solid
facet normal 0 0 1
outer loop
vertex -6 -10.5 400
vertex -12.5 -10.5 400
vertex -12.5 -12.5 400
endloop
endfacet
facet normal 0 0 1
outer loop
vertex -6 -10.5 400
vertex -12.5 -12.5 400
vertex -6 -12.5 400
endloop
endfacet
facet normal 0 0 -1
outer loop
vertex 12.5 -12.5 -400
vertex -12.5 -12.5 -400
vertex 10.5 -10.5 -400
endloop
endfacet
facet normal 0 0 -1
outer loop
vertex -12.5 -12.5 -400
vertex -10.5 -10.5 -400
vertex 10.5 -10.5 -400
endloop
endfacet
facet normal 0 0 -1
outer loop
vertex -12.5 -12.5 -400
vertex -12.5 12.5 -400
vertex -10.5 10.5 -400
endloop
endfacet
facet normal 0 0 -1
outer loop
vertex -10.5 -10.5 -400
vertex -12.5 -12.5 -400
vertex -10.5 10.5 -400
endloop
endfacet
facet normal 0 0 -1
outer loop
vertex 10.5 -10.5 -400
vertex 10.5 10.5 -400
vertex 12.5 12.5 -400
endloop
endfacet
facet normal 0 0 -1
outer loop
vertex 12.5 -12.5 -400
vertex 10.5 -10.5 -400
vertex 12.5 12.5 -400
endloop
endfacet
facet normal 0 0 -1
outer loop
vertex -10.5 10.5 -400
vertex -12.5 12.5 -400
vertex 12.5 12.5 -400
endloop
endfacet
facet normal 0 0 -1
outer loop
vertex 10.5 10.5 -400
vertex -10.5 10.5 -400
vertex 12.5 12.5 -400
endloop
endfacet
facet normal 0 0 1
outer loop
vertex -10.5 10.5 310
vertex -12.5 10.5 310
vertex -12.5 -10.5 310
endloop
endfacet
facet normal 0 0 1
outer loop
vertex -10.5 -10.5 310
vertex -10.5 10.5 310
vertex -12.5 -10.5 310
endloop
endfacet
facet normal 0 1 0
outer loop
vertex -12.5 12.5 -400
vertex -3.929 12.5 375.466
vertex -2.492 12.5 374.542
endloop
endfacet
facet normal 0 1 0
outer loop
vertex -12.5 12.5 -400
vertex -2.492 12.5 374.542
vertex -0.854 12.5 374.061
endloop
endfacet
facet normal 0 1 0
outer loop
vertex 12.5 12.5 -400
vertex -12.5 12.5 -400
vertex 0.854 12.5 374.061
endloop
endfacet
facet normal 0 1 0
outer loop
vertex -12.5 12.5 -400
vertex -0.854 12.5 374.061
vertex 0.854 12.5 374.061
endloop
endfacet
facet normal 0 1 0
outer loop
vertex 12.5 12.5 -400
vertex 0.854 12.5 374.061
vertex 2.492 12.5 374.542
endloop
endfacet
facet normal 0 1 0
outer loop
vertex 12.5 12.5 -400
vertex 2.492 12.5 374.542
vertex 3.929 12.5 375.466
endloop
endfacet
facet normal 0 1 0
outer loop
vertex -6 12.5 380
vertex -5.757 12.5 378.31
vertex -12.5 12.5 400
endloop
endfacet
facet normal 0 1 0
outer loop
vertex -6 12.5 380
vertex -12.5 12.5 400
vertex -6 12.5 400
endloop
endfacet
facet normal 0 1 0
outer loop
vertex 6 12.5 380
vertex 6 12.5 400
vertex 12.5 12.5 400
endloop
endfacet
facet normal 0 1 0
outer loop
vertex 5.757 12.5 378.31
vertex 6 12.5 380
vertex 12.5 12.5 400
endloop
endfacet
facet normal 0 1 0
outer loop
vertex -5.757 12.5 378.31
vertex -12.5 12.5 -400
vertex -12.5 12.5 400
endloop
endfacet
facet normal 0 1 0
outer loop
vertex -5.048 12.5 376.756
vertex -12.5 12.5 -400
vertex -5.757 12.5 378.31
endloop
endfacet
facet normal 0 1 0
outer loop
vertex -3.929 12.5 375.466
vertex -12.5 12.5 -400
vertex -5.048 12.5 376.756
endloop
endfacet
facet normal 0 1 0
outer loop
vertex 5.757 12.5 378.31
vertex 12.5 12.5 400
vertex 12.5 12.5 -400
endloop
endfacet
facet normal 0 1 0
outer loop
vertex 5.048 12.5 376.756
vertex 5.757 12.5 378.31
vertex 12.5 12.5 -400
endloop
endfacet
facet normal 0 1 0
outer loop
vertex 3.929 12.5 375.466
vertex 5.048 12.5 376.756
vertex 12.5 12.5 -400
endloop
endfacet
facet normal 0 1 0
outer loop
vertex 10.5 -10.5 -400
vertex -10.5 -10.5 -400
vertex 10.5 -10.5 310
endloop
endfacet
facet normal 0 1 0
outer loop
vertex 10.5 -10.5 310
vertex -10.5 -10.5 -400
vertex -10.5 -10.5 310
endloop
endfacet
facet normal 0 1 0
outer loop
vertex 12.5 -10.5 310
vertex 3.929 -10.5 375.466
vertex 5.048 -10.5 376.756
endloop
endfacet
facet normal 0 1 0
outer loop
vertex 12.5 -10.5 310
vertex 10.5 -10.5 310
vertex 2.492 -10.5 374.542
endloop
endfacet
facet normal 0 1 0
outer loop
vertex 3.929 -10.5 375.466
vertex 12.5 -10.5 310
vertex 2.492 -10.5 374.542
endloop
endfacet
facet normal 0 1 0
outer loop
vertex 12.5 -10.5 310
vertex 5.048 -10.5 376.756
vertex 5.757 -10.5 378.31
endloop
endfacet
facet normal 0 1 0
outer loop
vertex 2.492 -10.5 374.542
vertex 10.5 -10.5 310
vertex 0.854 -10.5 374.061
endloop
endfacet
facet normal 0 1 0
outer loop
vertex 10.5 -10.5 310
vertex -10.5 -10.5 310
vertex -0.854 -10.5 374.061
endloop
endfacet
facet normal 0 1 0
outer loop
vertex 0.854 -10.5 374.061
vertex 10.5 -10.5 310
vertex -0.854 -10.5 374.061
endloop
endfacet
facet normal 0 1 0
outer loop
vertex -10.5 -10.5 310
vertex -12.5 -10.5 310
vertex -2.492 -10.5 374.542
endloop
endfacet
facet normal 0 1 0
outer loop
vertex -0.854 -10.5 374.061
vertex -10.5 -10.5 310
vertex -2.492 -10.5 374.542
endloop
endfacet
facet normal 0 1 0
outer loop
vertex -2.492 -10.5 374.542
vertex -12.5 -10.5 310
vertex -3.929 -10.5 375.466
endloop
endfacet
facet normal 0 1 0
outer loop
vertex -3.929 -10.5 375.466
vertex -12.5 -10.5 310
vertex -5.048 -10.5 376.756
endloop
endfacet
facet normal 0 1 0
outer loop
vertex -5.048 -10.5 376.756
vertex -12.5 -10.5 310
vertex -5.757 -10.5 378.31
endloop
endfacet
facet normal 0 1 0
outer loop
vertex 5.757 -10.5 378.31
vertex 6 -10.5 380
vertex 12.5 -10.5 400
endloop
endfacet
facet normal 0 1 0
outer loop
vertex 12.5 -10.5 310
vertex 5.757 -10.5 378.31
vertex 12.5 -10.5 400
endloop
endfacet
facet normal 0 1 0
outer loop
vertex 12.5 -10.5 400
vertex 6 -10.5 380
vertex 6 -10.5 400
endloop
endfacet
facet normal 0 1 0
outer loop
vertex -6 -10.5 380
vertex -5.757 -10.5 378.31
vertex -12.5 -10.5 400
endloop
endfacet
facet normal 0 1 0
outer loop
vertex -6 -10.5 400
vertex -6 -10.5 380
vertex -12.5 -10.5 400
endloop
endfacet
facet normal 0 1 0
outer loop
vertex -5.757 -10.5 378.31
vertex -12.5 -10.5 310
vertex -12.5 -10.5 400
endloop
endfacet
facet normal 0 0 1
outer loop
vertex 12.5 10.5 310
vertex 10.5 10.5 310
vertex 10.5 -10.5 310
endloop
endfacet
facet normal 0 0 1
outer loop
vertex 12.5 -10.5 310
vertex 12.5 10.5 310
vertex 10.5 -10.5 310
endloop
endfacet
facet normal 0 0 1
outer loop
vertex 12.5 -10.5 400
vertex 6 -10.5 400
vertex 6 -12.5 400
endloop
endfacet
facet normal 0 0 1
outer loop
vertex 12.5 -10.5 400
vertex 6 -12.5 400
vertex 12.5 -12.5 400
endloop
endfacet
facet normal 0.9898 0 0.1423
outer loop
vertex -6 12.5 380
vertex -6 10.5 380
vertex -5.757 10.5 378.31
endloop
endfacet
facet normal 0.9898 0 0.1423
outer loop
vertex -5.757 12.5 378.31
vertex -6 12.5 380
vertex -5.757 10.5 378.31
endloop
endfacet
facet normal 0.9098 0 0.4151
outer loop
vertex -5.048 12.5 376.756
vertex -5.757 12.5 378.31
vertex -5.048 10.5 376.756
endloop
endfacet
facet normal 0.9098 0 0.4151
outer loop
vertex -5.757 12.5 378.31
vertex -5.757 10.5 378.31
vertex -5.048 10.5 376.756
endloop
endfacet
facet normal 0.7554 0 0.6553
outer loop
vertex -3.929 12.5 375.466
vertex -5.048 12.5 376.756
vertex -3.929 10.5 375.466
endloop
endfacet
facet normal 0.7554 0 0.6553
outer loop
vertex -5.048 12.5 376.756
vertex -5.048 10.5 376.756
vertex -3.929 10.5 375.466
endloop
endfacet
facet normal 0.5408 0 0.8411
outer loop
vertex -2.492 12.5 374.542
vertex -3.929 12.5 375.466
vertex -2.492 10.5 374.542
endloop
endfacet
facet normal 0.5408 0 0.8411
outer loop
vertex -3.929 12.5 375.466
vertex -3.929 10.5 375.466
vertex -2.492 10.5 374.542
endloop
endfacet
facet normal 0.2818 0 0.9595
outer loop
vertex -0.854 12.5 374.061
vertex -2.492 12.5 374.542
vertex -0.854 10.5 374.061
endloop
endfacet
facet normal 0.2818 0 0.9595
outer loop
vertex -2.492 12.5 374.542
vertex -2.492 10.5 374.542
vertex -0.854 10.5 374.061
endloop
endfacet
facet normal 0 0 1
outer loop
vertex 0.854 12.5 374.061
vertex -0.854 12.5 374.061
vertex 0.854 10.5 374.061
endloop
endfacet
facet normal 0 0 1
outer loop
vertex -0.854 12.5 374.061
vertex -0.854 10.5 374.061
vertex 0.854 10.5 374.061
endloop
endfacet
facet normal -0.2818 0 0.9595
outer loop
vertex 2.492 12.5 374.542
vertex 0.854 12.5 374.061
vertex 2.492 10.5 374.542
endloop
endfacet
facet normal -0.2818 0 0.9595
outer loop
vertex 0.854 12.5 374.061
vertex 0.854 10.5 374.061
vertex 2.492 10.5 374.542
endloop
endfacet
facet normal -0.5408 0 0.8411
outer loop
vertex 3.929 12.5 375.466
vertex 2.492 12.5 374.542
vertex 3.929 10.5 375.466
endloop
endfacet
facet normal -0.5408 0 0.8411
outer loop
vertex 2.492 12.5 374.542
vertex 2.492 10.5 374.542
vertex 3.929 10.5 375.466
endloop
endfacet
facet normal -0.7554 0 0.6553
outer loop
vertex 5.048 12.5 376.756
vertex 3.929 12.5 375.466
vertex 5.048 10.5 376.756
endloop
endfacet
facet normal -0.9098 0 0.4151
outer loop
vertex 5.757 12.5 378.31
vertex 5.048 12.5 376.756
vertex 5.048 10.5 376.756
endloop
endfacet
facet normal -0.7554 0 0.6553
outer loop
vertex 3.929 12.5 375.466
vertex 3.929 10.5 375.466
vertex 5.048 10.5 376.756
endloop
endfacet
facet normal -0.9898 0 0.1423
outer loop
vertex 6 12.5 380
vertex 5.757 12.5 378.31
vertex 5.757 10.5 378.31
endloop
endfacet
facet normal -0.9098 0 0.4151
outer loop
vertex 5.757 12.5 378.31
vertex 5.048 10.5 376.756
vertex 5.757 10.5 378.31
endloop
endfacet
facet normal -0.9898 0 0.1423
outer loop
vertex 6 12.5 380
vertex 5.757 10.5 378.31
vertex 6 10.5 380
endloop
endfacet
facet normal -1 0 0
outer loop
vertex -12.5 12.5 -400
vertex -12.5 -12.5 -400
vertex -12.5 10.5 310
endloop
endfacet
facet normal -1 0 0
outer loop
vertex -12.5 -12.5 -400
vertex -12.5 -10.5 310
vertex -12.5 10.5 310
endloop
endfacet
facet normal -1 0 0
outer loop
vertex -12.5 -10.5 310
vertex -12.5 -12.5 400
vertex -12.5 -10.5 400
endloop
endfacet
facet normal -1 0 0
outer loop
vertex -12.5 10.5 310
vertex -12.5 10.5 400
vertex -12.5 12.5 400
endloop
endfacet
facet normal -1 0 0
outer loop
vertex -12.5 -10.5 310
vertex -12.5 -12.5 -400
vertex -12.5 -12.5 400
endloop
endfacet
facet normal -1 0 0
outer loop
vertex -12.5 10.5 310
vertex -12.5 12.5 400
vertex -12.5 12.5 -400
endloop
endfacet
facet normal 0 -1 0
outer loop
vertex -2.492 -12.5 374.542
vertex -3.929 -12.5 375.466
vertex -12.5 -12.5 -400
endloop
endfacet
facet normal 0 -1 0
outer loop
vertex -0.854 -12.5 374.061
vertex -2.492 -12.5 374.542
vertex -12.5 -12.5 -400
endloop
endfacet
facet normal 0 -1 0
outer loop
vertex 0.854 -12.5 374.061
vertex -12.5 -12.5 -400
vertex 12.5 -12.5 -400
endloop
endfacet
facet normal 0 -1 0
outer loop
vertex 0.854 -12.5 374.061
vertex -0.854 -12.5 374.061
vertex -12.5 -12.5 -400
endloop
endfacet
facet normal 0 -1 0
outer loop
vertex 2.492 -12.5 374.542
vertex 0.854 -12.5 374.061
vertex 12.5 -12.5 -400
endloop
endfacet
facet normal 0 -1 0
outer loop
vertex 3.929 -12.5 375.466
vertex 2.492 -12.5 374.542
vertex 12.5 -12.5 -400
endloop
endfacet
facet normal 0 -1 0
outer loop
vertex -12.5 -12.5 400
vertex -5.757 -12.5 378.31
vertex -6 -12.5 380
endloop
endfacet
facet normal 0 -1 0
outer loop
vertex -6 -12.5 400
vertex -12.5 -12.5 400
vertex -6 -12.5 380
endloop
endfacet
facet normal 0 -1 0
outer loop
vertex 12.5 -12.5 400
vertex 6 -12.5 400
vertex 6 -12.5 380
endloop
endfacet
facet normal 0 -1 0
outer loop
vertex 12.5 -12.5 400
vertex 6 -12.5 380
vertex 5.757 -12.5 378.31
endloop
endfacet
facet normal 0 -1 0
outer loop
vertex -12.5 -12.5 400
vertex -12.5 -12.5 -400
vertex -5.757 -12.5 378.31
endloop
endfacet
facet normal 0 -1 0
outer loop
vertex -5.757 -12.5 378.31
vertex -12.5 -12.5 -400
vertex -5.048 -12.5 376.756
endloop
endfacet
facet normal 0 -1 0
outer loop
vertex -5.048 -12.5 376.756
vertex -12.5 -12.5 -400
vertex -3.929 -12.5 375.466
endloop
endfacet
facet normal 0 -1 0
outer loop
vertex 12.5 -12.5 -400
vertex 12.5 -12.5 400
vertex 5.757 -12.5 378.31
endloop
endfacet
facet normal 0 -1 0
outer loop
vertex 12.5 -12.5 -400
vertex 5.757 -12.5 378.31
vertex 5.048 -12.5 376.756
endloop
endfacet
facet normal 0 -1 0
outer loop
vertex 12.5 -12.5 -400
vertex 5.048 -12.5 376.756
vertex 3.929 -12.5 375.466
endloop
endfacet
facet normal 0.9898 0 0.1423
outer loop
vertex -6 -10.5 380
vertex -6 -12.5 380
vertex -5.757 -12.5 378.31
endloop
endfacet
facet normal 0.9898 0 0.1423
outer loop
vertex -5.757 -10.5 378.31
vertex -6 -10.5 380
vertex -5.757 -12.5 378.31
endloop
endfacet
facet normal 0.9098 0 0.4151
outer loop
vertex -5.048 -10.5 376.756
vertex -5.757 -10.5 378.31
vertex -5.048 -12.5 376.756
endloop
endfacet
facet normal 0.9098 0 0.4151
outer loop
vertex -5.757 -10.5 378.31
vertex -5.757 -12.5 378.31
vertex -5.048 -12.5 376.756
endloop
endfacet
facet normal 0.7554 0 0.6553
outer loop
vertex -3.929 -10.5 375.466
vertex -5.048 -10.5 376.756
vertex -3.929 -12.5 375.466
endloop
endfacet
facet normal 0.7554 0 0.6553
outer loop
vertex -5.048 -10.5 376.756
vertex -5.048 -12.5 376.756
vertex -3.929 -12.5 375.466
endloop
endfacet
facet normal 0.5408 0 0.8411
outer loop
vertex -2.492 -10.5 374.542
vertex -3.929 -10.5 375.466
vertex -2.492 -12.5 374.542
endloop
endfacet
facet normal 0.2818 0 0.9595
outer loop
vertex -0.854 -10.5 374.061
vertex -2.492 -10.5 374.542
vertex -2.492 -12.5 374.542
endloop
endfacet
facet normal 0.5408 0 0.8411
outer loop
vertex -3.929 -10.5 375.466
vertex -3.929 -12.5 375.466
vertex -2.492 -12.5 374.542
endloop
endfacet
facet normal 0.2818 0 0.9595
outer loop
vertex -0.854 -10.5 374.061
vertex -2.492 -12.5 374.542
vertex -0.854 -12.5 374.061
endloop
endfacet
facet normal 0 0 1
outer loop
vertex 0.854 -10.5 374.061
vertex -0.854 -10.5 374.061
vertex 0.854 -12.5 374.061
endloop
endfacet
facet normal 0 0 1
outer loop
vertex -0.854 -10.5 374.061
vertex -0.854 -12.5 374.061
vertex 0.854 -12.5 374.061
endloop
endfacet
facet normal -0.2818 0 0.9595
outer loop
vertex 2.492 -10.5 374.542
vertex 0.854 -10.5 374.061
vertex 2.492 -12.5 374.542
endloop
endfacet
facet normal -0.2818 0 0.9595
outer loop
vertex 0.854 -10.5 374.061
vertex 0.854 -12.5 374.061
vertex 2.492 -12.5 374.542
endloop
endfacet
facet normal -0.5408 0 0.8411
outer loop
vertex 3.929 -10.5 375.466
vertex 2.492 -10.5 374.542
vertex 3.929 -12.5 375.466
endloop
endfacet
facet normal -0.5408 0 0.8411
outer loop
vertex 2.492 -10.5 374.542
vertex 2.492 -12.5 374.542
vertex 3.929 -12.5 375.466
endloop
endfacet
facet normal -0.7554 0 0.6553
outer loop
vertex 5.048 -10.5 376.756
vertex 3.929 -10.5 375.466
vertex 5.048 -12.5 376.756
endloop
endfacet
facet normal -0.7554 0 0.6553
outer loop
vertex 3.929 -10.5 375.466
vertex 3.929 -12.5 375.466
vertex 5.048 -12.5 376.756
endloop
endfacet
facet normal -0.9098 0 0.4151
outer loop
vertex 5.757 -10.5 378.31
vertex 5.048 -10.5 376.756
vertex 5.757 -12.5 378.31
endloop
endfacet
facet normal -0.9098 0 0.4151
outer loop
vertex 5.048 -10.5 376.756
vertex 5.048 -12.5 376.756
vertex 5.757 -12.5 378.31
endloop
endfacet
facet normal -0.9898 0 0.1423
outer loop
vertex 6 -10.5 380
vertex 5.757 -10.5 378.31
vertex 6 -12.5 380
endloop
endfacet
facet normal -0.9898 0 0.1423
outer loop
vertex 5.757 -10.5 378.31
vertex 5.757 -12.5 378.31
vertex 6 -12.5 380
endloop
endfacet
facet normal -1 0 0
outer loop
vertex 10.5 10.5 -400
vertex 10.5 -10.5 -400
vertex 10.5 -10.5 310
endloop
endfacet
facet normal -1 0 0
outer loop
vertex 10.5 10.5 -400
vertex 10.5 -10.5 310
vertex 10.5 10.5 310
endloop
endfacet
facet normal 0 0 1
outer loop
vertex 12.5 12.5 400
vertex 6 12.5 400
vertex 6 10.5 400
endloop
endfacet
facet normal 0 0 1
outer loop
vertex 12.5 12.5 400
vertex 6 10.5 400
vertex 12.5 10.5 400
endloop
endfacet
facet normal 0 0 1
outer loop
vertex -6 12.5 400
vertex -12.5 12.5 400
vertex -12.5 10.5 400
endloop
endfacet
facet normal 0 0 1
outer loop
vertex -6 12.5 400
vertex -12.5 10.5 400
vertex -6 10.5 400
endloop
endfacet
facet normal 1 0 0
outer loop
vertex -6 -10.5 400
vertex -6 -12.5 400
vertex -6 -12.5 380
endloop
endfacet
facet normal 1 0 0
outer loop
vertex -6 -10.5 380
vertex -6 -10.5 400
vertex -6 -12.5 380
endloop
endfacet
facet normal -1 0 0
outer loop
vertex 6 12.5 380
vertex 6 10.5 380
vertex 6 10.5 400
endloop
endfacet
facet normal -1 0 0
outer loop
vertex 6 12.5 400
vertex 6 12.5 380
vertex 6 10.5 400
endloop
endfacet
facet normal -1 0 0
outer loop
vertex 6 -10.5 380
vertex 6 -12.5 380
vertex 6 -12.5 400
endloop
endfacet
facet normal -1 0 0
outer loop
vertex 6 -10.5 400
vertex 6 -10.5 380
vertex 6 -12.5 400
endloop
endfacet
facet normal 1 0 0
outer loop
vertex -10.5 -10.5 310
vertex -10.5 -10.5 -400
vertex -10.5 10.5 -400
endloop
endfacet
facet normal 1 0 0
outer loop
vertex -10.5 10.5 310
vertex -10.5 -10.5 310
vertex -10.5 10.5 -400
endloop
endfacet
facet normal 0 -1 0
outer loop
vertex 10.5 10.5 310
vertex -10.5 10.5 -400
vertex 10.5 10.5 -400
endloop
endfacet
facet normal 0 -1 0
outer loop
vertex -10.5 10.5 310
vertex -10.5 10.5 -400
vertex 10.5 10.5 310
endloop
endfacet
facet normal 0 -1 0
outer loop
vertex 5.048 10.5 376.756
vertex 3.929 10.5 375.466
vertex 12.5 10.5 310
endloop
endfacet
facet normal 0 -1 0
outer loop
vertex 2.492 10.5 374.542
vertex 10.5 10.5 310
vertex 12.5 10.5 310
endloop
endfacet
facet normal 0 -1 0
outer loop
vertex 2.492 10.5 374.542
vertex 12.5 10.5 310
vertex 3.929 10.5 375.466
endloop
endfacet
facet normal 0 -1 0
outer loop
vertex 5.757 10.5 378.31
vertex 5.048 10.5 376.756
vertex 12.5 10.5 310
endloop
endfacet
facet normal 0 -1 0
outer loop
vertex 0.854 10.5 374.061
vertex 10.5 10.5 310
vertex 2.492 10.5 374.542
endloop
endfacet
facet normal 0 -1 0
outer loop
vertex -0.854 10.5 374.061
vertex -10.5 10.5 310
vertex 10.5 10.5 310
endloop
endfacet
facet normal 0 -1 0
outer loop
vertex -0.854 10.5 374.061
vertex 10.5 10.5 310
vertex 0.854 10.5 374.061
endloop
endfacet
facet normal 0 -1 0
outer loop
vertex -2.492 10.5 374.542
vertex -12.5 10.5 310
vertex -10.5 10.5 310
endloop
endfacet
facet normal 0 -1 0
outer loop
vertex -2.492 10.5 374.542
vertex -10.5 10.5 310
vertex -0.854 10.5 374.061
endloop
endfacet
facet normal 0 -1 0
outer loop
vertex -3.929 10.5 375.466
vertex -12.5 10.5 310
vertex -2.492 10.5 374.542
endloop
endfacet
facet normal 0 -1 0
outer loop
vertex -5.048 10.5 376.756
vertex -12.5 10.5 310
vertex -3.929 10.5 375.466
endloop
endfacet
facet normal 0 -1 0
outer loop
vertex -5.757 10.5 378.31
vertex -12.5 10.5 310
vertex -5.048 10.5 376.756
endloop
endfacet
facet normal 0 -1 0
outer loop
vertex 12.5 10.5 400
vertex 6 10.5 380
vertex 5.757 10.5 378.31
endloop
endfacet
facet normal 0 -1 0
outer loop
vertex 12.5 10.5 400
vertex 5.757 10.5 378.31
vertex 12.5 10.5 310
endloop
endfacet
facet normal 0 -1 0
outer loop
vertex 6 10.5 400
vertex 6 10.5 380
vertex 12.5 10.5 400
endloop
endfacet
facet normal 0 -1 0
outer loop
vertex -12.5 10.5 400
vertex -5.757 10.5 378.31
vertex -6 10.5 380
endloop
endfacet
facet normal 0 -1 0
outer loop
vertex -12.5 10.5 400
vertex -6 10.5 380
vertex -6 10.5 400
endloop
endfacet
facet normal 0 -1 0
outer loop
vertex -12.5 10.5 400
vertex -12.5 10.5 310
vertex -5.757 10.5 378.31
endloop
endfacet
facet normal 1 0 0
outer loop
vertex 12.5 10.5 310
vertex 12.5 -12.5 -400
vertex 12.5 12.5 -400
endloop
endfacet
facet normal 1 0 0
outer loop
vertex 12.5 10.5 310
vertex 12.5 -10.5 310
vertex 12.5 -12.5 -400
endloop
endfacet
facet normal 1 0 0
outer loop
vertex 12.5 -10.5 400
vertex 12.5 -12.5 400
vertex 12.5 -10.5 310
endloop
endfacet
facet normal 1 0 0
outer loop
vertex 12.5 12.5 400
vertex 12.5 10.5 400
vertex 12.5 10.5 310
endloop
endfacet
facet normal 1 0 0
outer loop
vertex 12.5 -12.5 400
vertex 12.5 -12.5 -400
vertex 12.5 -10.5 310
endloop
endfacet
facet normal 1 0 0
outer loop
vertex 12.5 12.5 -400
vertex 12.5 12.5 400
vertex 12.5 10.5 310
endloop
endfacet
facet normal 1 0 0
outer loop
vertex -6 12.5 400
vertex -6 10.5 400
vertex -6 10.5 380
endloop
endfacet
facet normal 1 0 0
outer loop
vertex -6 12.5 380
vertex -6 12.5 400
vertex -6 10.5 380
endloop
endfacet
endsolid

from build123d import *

# Parameters (mm, degrees)
F0_W     = 25
F0_H     = 25
F1_DEPTH = 400
F2_W     = 21
F2_H     = 21
F3_DEPTH = 800.001
F4_W     = 21
F4_H     = 90
F5_DEPTH = 25.001
F7_DEPTH = 25.001


with BuildPart() as f1:
    # F0 (on Top) → F1 (new body, symmetric)
    with BuildSketch(Plane.XY):
        Rectangle(F0_W, F0_H)
    extrude(amount=F1_DEPTH, both=True)

    # F2 (on face) → F3 (cut, through all)
    with BuildSketch(Plane.XY.offset(400)):
        Rectangle(F2_W, F2_H)
    extrude(amount=-F3_DEPTH, mode=Mode.SUBTRACT)

    # F4 (on face) → F5 (cut, through all)
    with BuildSketch(Plane(origin=(-12.5, 0, 0), x_dir=(0, -1, 0), z_dir=(-1, 0, 0))):
        with Locations((0, 355)):
            Rectangle(F4_W, F4_H)
    extrude(amount=-F5_DEPTH, mode=Mode.SUBTRACT)

    # F6 (on face) → F7 (cut, through all)
    with BuildSketch(Plane.XZ.offset(12.5)):
        with BuildLine():
            Line((6, 380), (6, 400))
            Line((6, 400), (-6, 400))
            Line((-6, 400), (-6, 380))
            ThreePointArc((-6, 380), (0, 374), (6, 380))
        make_face()
    extrude(amount=-F7_DEPTH, mode=Mode.SUBTRACT)


solid = f1.part
